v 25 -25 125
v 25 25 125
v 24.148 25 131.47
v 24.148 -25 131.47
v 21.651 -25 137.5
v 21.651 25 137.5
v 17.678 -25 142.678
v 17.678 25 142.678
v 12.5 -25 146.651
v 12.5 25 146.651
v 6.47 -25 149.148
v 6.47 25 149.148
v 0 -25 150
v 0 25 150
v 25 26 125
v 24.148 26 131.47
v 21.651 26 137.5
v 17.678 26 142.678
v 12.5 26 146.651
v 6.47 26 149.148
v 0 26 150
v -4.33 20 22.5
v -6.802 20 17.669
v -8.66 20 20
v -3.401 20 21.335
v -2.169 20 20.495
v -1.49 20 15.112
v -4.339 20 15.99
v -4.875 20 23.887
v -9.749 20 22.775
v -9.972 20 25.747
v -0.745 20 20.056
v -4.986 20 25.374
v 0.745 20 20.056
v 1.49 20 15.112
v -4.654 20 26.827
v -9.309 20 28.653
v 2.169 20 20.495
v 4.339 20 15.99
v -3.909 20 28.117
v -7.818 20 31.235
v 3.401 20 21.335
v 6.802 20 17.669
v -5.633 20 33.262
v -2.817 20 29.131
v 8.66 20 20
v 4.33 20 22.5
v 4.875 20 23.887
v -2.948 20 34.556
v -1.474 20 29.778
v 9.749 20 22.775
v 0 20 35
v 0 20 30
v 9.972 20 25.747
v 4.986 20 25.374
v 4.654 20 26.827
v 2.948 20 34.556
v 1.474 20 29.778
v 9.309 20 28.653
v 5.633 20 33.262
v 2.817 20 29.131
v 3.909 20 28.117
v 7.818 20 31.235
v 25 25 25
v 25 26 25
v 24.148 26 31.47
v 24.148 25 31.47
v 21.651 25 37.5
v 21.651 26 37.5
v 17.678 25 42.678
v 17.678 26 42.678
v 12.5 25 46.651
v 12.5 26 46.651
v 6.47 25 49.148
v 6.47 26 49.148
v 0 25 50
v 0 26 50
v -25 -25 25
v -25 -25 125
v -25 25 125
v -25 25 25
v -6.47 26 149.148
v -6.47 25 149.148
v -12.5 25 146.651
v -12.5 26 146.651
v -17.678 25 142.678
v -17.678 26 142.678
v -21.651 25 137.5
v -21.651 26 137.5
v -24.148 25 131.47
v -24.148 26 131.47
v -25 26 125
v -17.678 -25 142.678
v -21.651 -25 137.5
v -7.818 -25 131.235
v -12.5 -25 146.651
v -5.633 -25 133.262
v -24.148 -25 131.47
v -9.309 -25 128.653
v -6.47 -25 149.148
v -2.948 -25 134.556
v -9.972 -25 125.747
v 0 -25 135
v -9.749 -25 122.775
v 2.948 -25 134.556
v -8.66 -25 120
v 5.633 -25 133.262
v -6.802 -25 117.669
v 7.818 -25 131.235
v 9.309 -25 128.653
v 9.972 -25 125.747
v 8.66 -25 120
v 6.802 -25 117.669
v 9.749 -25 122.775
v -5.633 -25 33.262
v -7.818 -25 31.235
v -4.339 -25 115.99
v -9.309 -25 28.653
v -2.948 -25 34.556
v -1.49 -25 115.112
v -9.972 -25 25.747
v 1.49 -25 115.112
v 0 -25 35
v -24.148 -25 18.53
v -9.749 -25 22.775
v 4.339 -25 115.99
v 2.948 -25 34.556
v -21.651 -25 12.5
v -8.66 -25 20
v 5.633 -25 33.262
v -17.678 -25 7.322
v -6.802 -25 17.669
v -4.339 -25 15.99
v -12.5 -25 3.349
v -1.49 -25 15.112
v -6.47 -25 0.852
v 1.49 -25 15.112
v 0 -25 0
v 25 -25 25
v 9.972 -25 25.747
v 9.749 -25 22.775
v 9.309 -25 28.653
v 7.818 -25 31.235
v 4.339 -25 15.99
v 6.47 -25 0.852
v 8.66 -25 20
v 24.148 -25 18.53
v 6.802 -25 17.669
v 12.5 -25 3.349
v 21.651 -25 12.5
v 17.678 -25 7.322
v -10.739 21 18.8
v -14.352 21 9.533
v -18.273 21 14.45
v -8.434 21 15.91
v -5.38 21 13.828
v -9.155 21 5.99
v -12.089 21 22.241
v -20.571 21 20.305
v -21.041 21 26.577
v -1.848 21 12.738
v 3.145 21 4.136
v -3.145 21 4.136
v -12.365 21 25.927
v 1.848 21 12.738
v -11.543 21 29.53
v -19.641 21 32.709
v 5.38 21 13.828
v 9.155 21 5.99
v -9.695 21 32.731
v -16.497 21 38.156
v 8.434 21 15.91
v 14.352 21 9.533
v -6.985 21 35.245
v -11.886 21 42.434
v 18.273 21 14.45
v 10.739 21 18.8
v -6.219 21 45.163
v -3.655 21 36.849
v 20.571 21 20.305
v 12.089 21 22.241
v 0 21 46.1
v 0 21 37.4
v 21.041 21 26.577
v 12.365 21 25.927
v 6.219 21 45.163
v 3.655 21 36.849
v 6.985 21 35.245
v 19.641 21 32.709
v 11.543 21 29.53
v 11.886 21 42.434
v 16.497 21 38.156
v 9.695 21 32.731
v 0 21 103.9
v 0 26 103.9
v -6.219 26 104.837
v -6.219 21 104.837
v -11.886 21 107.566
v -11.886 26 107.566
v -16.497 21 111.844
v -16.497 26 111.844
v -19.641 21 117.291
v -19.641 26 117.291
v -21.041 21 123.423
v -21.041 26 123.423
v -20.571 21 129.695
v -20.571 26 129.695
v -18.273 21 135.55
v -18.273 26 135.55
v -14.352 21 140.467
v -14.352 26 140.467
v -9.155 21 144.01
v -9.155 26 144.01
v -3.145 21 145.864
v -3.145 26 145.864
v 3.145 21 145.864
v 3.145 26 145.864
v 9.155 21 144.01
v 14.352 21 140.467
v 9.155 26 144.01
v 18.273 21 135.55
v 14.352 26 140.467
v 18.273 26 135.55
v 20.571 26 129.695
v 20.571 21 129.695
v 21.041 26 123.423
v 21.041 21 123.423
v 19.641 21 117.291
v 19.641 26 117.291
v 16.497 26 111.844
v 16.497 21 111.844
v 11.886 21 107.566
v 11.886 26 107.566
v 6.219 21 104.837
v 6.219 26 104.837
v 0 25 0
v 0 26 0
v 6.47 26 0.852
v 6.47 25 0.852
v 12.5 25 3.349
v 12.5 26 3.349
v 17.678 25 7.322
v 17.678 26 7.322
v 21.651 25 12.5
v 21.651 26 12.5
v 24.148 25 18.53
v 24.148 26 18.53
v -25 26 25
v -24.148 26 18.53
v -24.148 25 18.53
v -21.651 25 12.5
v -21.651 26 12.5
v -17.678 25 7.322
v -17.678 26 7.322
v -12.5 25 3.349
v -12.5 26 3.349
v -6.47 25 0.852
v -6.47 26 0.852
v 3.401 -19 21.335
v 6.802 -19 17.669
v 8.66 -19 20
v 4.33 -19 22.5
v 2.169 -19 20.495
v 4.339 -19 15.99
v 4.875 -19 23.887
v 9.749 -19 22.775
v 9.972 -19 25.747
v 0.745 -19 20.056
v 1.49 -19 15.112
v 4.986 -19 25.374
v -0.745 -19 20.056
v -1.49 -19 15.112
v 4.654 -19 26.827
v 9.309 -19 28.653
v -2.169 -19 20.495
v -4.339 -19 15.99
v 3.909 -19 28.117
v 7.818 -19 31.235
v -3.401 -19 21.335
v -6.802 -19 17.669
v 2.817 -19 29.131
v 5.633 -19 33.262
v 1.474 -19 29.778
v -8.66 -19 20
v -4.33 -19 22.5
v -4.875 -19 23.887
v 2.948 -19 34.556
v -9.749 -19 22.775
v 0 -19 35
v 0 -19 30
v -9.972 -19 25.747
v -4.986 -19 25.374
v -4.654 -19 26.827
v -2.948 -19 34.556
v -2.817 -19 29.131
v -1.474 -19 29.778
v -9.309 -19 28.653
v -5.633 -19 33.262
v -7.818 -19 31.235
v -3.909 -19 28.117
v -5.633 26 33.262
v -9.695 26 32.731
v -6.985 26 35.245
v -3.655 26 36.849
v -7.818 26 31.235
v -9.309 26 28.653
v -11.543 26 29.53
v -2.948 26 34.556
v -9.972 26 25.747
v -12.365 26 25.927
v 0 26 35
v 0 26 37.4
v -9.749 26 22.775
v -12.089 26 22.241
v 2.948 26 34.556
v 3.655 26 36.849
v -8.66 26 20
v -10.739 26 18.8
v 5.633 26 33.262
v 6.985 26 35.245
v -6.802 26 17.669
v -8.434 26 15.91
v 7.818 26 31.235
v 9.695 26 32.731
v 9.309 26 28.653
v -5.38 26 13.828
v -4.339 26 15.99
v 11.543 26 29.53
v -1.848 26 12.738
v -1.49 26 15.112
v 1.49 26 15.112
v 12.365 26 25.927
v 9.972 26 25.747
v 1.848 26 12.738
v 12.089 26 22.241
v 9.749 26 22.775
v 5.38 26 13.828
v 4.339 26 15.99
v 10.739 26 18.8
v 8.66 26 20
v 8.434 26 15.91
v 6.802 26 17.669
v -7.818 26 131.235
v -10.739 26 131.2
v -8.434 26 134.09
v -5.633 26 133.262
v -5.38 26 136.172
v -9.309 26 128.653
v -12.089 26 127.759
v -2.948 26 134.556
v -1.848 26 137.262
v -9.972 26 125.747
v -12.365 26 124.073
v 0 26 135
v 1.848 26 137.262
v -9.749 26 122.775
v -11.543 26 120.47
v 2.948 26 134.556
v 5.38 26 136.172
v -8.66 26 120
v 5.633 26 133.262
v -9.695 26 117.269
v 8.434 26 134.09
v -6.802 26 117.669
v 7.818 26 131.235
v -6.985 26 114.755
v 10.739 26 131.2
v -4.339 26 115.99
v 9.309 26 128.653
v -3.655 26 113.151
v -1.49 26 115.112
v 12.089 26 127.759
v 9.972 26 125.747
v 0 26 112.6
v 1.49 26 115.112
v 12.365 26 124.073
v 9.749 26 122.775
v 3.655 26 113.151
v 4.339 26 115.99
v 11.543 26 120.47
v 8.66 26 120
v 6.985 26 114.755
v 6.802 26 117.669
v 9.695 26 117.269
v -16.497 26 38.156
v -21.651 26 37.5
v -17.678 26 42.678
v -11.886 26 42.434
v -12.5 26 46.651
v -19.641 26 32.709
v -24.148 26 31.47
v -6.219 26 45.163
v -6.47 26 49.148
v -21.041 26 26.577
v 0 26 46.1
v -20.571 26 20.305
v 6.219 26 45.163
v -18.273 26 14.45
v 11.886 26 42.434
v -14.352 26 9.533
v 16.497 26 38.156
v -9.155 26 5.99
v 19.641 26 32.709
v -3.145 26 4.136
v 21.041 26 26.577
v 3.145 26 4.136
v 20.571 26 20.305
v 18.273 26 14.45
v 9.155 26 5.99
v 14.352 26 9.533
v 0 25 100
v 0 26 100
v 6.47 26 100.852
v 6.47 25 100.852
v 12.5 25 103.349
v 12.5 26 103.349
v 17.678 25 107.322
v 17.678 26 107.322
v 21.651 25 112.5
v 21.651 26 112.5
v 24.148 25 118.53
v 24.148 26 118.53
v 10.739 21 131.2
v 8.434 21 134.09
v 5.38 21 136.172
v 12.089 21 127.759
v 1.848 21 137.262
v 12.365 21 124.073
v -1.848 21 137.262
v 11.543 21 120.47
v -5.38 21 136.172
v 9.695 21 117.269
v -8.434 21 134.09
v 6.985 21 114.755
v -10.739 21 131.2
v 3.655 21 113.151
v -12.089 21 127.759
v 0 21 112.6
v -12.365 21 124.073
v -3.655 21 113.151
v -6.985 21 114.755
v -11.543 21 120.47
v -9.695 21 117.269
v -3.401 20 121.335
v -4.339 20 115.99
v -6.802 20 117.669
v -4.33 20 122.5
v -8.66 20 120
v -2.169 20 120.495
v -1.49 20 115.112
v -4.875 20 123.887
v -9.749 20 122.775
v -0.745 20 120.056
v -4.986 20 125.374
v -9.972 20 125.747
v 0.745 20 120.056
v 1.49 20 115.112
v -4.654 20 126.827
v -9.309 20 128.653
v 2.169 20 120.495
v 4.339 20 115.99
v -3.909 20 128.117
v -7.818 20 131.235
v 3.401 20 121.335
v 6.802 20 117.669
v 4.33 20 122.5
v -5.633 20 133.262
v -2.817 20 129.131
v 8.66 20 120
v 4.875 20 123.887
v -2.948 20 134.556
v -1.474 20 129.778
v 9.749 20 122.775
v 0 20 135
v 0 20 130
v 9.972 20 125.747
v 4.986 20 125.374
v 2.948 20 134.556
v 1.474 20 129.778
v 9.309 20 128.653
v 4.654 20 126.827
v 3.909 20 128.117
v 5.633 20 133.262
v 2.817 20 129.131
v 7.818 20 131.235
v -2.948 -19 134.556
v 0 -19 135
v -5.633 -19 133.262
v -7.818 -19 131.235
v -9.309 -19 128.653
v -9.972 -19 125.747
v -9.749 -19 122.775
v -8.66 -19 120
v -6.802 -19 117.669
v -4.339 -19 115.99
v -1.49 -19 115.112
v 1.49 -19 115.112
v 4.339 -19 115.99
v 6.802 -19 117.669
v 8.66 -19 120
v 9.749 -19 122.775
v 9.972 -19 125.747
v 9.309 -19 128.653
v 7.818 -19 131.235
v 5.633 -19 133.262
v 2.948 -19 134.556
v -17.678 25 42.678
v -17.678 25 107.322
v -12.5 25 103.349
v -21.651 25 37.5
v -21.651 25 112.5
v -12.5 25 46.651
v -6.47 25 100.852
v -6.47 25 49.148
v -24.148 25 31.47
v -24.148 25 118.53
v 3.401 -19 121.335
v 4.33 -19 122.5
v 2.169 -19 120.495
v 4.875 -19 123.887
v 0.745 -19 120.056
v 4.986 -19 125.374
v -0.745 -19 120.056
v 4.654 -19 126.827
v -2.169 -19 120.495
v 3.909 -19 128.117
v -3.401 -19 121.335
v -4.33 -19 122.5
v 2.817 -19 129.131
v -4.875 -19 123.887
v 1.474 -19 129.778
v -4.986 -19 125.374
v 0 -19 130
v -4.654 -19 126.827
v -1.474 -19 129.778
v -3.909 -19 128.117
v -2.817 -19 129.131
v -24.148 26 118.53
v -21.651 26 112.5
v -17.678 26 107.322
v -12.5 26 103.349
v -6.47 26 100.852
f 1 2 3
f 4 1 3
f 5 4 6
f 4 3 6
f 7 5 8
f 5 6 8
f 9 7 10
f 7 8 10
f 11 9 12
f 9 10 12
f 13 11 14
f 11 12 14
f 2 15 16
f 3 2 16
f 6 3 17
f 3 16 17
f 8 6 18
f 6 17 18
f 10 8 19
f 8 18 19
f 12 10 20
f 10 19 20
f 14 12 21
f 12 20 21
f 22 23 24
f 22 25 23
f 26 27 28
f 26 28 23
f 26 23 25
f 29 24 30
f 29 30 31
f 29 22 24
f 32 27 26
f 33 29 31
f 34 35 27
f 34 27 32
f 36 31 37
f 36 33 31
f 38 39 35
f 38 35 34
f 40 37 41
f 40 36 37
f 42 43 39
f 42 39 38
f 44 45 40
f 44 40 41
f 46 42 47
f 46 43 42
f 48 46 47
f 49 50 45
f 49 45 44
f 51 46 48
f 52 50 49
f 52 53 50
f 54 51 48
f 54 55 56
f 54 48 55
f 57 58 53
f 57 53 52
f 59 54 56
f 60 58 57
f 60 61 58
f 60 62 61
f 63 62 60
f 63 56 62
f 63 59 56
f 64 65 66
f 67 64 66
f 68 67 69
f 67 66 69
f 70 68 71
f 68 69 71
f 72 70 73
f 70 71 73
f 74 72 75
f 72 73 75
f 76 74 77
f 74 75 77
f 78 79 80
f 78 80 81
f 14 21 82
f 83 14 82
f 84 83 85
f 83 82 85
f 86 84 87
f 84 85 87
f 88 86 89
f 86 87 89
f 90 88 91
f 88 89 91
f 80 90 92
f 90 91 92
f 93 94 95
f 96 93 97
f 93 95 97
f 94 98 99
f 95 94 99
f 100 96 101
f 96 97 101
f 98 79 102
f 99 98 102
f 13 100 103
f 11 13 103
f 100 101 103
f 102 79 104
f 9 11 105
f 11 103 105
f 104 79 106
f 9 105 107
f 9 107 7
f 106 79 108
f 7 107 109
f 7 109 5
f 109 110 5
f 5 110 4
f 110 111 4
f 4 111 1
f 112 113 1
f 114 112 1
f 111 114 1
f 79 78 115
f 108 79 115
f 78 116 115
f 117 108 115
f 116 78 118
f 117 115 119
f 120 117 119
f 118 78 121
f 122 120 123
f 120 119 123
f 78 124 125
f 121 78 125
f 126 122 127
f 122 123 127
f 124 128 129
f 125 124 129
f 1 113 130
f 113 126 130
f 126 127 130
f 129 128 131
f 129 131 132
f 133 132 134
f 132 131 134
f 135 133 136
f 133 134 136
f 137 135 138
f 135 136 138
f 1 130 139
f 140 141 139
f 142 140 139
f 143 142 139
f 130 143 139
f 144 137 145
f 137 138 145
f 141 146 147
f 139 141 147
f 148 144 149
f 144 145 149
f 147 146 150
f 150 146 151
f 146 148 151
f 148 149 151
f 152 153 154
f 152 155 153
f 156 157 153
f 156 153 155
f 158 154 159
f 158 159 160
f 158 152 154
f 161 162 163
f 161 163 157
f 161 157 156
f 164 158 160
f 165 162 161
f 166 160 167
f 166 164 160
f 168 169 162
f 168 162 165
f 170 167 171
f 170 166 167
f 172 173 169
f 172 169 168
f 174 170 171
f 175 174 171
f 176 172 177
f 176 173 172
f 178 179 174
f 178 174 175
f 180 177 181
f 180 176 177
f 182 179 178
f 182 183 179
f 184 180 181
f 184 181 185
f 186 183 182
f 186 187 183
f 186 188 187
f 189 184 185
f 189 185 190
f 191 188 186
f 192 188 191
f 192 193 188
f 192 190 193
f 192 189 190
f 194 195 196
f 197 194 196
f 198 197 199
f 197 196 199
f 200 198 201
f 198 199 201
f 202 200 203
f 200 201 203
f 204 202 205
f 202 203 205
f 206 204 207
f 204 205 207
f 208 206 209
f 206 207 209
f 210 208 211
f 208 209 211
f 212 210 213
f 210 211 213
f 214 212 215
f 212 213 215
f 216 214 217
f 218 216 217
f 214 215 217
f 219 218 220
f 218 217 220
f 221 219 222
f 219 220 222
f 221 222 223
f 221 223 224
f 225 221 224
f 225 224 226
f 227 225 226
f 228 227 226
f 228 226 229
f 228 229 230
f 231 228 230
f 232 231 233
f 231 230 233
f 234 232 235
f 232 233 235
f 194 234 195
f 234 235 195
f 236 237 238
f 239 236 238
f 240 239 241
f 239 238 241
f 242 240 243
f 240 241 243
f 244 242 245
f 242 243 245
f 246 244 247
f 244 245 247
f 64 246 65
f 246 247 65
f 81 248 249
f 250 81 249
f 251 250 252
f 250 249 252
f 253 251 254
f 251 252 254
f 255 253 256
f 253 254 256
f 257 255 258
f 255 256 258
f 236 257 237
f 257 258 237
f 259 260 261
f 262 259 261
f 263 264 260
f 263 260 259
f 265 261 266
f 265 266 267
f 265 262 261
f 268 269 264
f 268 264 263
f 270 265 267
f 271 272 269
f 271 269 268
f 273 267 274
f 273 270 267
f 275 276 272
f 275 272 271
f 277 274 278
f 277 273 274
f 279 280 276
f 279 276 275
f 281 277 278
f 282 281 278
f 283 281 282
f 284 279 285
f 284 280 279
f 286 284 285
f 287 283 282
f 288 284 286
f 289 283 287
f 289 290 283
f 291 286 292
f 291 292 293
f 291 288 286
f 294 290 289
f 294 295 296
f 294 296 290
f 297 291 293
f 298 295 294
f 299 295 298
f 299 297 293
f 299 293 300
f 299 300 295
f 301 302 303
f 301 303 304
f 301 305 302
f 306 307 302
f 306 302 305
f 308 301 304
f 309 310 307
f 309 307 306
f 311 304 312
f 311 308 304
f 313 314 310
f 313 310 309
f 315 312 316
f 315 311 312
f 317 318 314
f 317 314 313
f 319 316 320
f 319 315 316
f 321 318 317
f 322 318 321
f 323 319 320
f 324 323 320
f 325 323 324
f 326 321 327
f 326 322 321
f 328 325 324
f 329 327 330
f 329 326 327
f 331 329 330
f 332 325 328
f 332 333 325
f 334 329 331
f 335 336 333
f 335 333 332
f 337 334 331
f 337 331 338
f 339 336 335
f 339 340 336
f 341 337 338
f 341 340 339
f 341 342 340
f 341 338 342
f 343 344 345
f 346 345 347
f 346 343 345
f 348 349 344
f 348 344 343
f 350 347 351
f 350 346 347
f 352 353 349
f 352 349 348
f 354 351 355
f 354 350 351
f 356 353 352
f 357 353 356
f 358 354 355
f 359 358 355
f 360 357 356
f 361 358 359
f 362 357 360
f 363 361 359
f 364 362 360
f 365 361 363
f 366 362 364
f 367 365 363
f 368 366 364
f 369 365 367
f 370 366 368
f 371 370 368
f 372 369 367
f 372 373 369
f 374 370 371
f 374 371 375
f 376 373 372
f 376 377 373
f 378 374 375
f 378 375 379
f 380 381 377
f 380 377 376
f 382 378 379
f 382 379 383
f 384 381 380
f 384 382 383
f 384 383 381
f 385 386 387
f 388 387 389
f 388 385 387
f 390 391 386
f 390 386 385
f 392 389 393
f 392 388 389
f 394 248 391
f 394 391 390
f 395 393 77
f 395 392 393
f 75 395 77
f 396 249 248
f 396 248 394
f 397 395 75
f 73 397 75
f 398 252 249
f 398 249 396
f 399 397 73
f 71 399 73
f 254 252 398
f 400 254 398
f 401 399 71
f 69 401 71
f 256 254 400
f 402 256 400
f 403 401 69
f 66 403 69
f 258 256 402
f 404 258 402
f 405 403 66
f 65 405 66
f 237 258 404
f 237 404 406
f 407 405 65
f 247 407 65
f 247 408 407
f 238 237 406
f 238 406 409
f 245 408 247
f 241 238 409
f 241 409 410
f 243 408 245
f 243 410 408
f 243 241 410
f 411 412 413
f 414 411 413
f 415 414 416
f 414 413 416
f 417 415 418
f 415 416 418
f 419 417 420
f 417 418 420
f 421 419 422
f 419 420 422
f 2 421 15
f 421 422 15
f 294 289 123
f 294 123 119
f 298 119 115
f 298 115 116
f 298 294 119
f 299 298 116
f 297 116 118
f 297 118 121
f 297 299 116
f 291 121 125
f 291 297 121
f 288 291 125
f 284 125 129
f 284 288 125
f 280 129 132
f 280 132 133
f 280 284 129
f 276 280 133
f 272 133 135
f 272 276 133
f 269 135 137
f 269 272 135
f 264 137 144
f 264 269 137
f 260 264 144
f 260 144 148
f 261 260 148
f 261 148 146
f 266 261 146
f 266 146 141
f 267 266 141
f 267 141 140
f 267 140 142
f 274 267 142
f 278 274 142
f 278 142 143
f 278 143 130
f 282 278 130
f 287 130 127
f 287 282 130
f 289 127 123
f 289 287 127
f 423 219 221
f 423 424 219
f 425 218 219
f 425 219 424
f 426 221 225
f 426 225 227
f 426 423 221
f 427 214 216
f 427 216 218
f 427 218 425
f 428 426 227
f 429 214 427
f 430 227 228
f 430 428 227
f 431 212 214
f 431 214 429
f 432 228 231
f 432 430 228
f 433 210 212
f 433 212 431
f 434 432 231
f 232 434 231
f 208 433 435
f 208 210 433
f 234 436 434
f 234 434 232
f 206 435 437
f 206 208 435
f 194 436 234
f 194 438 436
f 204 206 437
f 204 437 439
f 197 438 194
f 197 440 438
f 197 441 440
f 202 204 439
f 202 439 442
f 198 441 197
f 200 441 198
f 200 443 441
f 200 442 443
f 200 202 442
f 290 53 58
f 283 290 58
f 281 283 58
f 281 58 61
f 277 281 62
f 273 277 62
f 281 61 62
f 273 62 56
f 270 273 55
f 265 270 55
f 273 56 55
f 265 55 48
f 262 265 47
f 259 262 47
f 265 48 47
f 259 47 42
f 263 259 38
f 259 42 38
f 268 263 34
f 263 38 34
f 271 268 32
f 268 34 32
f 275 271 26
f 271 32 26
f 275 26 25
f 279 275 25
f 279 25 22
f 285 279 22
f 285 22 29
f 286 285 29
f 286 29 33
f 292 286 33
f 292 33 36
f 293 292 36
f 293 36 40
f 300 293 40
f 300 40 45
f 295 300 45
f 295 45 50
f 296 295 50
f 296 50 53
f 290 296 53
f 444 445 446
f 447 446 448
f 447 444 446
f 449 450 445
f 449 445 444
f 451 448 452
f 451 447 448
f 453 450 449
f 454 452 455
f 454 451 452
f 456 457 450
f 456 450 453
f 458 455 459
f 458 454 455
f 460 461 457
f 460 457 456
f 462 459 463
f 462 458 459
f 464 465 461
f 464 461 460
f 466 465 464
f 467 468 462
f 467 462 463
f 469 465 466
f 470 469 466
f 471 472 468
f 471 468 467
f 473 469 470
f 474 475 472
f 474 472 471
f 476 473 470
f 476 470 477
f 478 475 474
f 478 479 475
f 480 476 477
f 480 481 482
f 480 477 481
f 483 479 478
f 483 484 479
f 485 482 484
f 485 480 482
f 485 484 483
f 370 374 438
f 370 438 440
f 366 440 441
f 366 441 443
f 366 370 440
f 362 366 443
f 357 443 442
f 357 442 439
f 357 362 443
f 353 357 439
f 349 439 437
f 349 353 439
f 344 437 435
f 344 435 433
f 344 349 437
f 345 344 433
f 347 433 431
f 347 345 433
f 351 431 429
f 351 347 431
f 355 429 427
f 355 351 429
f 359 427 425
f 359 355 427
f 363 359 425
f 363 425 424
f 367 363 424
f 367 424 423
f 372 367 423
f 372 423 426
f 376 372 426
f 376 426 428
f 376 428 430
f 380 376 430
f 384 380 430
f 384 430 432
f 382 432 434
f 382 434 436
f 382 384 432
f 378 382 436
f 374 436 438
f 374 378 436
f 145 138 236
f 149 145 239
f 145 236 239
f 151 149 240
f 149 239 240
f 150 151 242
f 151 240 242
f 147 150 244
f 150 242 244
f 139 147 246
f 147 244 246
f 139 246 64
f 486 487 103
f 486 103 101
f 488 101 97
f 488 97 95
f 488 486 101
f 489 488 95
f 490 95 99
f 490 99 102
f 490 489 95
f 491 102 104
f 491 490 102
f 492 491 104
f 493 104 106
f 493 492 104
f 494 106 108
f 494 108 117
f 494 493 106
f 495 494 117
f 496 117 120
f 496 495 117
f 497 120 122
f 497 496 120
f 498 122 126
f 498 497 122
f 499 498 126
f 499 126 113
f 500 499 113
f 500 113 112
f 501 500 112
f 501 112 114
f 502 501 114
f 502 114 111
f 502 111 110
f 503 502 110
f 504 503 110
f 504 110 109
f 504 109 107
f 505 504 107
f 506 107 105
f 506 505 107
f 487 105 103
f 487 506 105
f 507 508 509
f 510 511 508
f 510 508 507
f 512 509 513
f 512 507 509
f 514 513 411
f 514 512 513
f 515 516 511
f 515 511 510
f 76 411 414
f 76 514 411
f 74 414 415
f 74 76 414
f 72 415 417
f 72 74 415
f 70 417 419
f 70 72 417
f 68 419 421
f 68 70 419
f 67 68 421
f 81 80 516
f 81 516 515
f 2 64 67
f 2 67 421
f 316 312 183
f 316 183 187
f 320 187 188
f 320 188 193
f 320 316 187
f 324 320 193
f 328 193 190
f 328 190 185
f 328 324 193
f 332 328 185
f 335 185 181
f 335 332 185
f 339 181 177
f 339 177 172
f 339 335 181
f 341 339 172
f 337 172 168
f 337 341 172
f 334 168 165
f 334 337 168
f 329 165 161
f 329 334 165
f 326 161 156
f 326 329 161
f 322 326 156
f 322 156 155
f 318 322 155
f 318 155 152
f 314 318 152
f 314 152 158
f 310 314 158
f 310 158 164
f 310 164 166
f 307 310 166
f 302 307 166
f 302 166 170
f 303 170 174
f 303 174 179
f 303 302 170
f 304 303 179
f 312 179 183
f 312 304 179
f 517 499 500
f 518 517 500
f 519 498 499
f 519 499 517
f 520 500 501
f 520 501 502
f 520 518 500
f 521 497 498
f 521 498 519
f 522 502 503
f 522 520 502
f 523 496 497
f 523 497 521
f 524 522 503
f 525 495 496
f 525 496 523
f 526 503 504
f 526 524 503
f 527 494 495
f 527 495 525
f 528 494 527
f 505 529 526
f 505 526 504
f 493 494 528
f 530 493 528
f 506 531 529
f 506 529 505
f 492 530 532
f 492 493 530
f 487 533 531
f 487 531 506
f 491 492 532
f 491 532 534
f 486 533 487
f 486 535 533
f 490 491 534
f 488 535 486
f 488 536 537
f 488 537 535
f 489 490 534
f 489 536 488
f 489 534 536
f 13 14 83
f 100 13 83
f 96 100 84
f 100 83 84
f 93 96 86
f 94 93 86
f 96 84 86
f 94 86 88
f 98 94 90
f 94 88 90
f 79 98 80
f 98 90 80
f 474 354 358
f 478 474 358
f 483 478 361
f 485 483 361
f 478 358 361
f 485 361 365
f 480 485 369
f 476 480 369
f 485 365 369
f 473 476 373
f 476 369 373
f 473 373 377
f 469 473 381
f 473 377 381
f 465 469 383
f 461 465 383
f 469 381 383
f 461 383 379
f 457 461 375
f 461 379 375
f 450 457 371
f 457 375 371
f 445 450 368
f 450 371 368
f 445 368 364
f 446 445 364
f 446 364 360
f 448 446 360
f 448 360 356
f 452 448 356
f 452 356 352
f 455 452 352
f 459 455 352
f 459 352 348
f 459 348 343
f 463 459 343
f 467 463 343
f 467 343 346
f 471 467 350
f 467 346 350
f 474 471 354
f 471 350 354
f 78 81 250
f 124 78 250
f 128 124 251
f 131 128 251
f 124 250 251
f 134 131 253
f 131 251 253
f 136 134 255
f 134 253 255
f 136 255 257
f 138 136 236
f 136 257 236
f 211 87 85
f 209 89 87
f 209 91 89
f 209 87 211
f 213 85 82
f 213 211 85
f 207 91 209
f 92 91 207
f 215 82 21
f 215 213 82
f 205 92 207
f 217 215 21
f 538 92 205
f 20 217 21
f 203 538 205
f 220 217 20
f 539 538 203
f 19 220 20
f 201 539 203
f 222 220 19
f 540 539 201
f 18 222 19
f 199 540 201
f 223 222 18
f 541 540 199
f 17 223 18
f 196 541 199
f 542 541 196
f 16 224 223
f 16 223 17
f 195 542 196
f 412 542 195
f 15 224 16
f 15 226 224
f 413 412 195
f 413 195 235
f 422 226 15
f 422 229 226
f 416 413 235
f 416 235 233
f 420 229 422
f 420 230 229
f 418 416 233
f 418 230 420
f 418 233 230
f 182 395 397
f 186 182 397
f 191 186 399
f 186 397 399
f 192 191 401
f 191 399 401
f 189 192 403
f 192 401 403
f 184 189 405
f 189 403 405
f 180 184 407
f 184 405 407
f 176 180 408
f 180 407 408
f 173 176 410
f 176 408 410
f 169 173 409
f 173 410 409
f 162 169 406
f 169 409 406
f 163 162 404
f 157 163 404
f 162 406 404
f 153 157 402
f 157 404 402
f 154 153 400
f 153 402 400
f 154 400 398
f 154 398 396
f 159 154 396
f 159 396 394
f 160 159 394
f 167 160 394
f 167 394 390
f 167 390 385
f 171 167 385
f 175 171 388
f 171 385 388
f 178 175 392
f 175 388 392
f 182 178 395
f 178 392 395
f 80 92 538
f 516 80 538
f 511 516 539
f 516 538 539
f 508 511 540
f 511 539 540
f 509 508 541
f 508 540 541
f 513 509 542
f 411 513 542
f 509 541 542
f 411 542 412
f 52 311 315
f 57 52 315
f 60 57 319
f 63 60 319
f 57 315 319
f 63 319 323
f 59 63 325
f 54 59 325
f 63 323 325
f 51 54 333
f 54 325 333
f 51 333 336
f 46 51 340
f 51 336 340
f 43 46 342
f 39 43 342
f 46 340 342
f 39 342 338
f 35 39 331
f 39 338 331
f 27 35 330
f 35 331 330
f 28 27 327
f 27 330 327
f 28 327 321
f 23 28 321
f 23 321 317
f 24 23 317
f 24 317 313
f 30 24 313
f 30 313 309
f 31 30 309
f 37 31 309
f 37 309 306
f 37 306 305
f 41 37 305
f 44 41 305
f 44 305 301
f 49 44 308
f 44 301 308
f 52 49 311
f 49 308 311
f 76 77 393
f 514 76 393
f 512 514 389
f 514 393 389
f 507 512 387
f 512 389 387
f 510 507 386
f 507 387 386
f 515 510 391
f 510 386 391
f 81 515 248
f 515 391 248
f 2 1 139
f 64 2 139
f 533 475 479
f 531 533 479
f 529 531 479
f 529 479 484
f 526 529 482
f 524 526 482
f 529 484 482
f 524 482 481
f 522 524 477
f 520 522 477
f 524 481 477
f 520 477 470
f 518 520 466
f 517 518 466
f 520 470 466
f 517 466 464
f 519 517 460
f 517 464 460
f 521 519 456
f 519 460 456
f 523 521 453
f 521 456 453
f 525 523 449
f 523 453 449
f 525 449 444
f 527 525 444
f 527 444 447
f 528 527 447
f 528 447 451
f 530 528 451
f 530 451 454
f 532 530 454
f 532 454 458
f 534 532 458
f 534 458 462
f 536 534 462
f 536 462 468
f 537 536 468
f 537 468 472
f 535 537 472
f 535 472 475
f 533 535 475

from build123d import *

# Parameters (mm, degrees)
SKIZZE1_W                       = 50
SKIZZE1_H                       = 50
AUFSATZ_LINEAR_AUSTRAGEN1_DEPTH = 150
SKIZZE2_W                       = 50
SKIZZE2_H                       = 50
AUFSATZ_LINEAR_AUSTRAGEN2_DEPTH = 1
SCHNITT_LINEAR_AUSTRAGEN1_DEPTH = 1
SCHNITT_LINEAR_AUSTRAGEN2_DEPTH = 50
SKIZZE5_R                       = 5
SCHNITT_LINEAR_AUSTRAGEN3_DEPTH = 75
SKIZZE6_R                       = 10
SCHNITT_LINEAR_AUSTRAGEN4_DEPTH = 6
SCHNITT_LINEAR_START            = -6
SKIZZE7_R                       = 10
SCHNITT_LINEAR_AUSTRAGEN5_DEPTH = 6
SKIZZE8_R                       = 21.1
SKIZZE8_R_2                     = 12.4
SCHNITT_LINEAR_AUSTRAGEN6_DEPTH = 5


with BuildPart() as part:
    # Skizze1 → Aufsatz-Linear austragen1 (new body)
    with BuildSketch(Plane.XY):
        Rectangle(SKIZZE1_W, SKIZZE1_H)
    extrude(amount=AUFSATZ_LINEAR_AUSTRAGEN1_DEPTH)

    # Skizze2 → Aufsatz-Linear austragen2 (add)
    with BuildSketch(Plane(origin=(0, 25, 0), x_dir=(1, 0, 0), z_dir=(0, 1, 0))):
        with Locations((0, -125)):
            Rectangle(SKIZZE2_W, SKIZZE2_H)
        with Locations((0, -25)):
            Rectangle(SKIZZE2_W, SKIZZE2_H)
    extrude(amount=AUFSATZ_LINEAR_AUSTRAGEN2_DEPTH)

    # Skizze3 → Schnitt-Linear austragen1 (cut)
    with BuildSketch(Plane(origin=(0, 26, 0), x_dir=(1, 0, 0), z_dir=(0, 1, 0))):
        with BuildLine():
            Line((4.2e-08, 0), (-25, 0))
            Line((-25, 0), (-25, -25))
            ThreePointArc((-25, -25), (-17.677669515, -7.322330455), (4.2e-08, 0))
        make_face()
        with BuildLine():
            Line((25, 0), (4.2e-08, 0))
            ThreePointArc((4.2e-08, 0), (17.677669545, -7.322330485), (25, -25))
            Line((25, -25), (25, 0))
        make_face()
        with BuildLine():
            ThreePointArc((0, -50), (-17.67766953, -42.67766953), (-25, -25))
            Line((-25, -25), (-25, -50))
            Line((-25, -50), (0, -50))
        make_face()
        with BuildLine():
            Line((25, -50), (25, -25))
            ThreePointArc((25, -25), (17.67766953, -42.67766953), (0, -50))
            Line((0, -50), (25, -50))
        make_face()
        with BuildLine():
            Line((-3.2e-08, -100), (-25, -100))
            Line((-25, -100), (-25, -125))
            ThreePointArc((-25, -125), (-17.677669541, -107.322330482), (-3.2e-08, -100))
        make_face()
        with BuildLine():
            Line((25, -100), (-3.2e-08, -100))
            ThreePointArc((-3.2e-08, -100), (17.677669518, -107.322330459), (25, -125))
            Line((25, -125), (25, -100))
        make_face()
        with BuildLine():
            ThreePointArc((5.8e-08, -150), (-17.677669509, -142.67766955), (-25, -125))
            Line((-25, -125), (-25, -150))
            Line((-25, -150), (5.8e-08, -150))
        make_face()
        with BuildLine():
            Line((25, -150), (25, -125))
            ThreePointArc((25, -125), (17.67766955, -142.677669509), (5.8e-08, -150))
            Line((5.8e-08, -150), (25, -150))
        make_face()
    extrude(amount=-SCHNITT_LINEAR_AUSTRAGEN1_DEPTH, mode=Mode.SUBTRACT)

    # Skizze4 → Schnitt-Linear austragen2 (cut)
    with BuildSketch(Plane(origin=(0, 25, 0), x_dir=(1, 0, 0), z_dir=(0, 1, 0))):
        with BuildLine():
            Line((25, -150), (25, -125))
            ThreePointArc((25, -125), (17.677669466, -142.677669593), (-1.79e-07, -150))
            Line((-1.79e-07, -150), (25, -150))
        make_face()
        with BuildLine():
            Line((-25, 0), (-25, -25))
            ThreePointArc((-25, -25), (-17.67766953, -7.32233047), (0, 0))
            Line((0, 0), (-25, 0))
        make_face()
        with BuildLine():
            Line((25, 0), (0, 0))
            ThreePointArc((0, 0), (17.67766953, -7.32233047), (25, -25))
            Line((25, -25), (25, 0))
        make_face()
        with BuildLine():
            ThreePointArc((-1.79e-07, -150), (-17.677669593, -142.677669466), (-25, -125))
            Line((-25, -125), (-25, -150))
            Line((-25, -150), (-1.79e-07, -150))
        make_face()
    extrude(amount=-SCHNITT_LINEAR_AUSTRAGEN2_DEPTH, mode=Mode.SUBTRACT)

    # Skizze5 → Schnitt-Linear austragen3 (cut)
    with BuildSketch(Plane(origin=(0, 26, 0), x_dir=(1, 0, 0), z_dir=(0, 1, 0))):
        with Locations((0, -25)):
            Circle(SKIZZE5_R)
        with Locations((0, -125)):
            Circle(SKIZZE5_R)
    extrude(amount=-SCHNITT_LINEAR_AUSTRAGEN3_DEPTH, mode=Mode.SUBTRACT)

    # Skizze6 → Schnitt-Linear austragen4 (cut)
    with BuildSketch(Plane(origin=(0, 26, 0), x_dir=(1, 0, 0), z_dir=(0, 1, 0))):
        with Locations((0, -125)):
            Circle(SKIZZE6_R)
        with Locations((0, -25)):
            Circle(SKIZZE6_R)
    extrude(amount=-SCHNITT_LINEAR_AUSTRAGEN4_DEPTH, mode=Mode.SUBTRACT)

    # Skizze7 → Schnitt-Linear austragen5 (cut)
    with BuildSketch(Plane.XZ.offset(25).offset(SCHNITT_LINEAR_START)):
        with Locations((0, 125)):
            Circle(SKIZZE7_R)
        with Locations((0, 25)):
            Circle(SKIZZE7_R)
    extrude(amount=SCHNITT_LINEAR_AUSTRAGEN5_DEPTH, mode=Mode.SUBTRACT)

    # Skizze8 → Schnitt-Linear austragen6 (cut)
    # profile 1 of 2: a face of its own
    with BuildSketch(Plane(origin=(0, 26, 0), x_dir=(1, 0, 0), z_dir=(0, 1, 0))):
        with Locations((0, -25)):
            Circle(SKIZZE8_R)
        with Locations((0, -25)):
            Circle(SKIZZE8_R_2, mode=Mode.SUBTRACT)
    # profile 2 of 2: a face of its own
    with BuildSketch(Plane(origin=(0, 26, 0), x_dir=(1, 0, 0), z_dir=(0, 1, 0))):
        with Locations((0, -125)):
            Circle(SKIZZE8_R)
        with Locations((0, -125)):
            Circle(SKIZZE8_R_2, mode=Mode.SUBTRACT)
    extrude(amount=-SCHNITT_LINEAR_AUSTRAGEN6_DEPTH, mode=Mode.SUBTRACT)


solid = part.part
